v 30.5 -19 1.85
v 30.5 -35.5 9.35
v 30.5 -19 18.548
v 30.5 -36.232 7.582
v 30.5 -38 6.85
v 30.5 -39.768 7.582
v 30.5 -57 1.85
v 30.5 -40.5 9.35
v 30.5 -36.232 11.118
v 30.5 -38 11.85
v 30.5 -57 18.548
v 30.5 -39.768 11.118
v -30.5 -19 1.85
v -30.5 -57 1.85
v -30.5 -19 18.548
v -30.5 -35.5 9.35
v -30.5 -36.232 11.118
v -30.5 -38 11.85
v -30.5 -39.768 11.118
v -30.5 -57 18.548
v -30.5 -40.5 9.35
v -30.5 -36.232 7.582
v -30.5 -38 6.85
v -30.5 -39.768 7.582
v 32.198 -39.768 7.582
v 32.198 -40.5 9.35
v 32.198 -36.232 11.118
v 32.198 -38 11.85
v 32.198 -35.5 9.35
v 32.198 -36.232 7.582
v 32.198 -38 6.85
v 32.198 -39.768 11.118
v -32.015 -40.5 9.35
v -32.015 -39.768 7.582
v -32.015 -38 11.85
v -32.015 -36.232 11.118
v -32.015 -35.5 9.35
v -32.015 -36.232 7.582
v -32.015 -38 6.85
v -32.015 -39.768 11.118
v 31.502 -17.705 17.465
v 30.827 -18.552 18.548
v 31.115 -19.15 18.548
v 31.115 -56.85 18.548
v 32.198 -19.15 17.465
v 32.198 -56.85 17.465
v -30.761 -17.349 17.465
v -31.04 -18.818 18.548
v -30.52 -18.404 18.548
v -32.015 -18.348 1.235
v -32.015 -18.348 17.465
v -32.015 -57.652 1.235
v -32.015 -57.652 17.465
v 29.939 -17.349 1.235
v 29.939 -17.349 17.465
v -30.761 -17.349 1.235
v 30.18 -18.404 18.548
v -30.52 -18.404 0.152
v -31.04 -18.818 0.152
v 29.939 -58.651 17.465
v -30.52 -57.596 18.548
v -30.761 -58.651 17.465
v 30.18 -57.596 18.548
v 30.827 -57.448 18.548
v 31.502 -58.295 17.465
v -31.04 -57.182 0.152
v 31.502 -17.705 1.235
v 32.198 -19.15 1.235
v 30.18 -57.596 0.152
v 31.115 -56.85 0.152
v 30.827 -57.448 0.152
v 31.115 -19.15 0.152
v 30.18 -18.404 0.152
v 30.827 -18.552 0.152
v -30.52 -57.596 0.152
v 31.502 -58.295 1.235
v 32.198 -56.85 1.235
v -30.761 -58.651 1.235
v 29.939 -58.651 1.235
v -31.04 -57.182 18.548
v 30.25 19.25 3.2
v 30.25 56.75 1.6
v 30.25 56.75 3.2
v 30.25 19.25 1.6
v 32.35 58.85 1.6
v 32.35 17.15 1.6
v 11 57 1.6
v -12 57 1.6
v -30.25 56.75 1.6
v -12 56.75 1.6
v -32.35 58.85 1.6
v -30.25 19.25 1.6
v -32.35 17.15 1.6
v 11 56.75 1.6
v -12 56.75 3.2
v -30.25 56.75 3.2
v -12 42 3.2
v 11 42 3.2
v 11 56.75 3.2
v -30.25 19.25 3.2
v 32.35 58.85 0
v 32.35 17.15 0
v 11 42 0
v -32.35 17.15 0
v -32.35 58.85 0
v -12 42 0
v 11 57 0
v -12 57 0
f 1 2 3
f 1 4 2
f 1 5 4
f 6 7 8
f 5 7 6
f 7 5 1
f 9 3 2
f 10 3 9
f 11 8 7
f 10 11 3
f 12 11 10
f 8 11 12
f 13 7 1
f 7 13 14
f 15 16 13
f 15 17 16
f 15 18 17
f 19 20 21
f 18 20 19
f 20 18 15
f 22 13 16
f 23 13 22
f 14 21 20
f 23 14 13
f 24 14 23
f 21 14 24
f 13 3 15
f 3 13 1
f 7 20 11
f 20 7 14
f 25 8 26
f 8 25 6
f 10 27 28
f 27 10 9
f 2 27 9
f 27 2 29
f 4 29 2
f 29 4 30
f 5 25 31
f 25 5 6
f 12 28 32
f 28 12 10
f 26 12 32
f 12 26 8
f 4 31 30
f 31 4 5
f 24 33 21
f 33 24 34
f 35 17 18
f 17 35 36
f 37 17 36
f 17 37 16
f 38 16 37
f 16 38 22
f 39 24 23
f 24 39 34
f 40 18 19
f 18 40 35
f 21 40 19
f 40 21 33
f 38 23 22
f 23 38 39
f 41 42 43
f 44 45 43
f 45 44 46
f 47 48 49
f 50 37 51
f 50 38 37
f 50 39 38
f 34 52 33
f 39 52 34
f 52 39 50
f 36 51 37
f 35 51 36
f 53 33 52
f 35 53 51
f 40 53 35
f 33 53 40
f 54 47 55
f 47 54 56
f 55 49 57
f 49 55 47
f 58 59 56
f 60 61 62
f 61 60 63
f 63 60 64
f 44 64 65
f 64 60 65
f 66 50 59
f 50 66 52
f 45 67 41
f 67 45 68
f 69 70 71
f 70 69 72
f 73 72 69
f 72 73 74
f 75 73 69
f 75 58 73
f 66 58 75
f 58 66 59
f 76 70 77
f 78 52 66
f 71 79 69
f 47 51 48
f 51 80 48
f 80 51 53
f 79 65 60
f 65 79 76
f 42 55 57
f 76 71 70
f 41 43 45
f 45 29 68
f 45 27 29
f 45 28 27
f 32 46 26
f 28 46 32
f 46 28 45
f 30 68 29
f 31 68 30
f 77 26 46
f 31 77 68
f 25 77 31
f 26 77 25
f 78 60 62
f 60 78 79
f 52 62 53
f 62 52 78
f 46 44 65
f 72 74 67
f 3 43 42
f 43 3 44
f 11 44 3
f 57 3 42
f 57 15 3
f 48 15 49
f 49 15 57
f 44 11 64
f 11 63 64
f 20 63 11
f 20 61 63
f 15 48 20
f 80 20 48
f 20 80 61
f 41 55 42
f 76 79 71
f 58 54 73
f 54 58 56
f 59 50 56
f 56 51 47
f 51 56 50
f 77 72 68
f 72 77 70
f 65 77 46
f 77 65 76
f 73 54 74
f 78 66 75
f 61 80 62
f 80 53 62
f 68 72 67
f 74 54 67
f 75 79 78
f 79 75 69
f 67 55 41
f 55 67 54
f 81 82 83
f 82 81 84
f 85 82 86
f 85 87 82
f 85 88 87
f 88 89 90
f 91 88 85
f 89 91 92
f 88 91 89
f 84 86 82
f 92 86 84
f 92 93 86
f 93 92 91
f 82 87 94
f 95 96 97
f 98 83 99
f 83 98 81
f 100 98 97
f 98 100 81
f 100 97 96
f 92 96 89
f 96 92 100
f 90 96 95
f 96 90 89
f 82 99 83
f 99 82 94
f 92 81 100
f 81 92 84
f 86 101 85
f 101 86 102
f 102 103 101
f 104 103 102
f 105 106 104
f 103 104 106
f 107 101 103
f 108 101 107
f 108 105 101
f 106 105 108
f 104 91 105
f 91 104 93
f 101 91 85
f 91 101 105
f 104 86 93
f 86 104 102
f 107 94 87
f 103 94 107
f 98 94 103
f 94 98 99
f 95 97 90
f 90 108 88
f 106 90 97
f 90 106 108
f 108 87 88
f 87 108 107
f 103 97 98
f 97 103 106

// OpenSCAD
// Written by Jordi Riera-Babures <jrierab@gmail.com>
// LM2596 with lateral voltage window V1.0 - Parameterisized for Customizer
//
// To the extent possible under law, the author(s) have dedicated all
// copyright and related and neighboring rights to this software to the
// public domain worldwide. This software is distributed without any
// warranty.
//
// You should have received a copy of the CC0 Public Domain
// Dedication along with this software.
// If not, see <http://creativecommons.org/publicdomain/zero/1.0/>.

// Length of the board (mm)
Board_Length = 61;          // [40:300]
// Width of the board (mm)
Board_Width = 38;           // [10:40]
// Height of the board and its components (mm)
Board_Height = 15;          // [10:40]
// Volatge Window width (mm)
Voltage_Window_Width = 15;  // [10:20]
// Volatge Window legnth (mm)
Voltage_Window_Length = 23; // [0:30]

// Input/output hole radius
Hole_radius = 2.5;          // [2:10]

// Space to take into account around the board (mm)
Security_Margin = 0.5;      // [0.:5.]
// Wall thickness (mm)
Wall_Thickness = 1.6;       // [1.:5.]

// Account for security margins and walls
Xtra = Security_Margin + 2*Wall_Thickness;
// Hole pos
Hole_pos_x = (Board_Length + Xtra) / 2;



// Build the box
translate([0, -Board_Width, (Board_Height + Xtra)/2]) LM2596_case();
// And the lidl
mirror([0, 0, 1]) translate([0, Board_Width, -1.5*Wall_Thickness]) LM2596_lid();



module LM2596_lid() {
    difference() {
        union() {
            // Internal lid
            cube([Board_Length - Security_Margin, Board_Width - Security_Margin, Wall_Thickness], true);
            translate([0, 0, Wall_Thickness])
                cube([Board_Length + Xtra, Board_Width + Xtra, Wall_Thickness], true);
        }
        union() {
            // Voltage window hole
            translate([(Board_Length - Voltage_Window_Width)/2 - Voltage_Window_Length - Security_Margin, (Board_Width - Voltage_Window_Width)/2, 0])
                cube([Voltage_Window_Length, Voltage_Window_Width, 3*Wall_Thickness], true);
        }
    }

}

module LM2596_case() {
    // Smooth the case
    Rounded_Corner_Radius = 2;

    // Hole extension
    Hole_h = 1*(Wall_Thickness + Security_Margin);
    // Input hole Y tanslation
    Hole_y = (Board_Width - Hole_radius - 4*Security_Margin)/2;

    // Case
    difference() {
        // External case
        roundedcube_simple([Board_Length + Xtra, Board_Width + Xtra, Board_Height + Xtra], true, Rounded_Corner_Radius);
        // "Empty" inside block
        union() {
            // Internal board space
            cube([Board_Length, Board_Width, Board_Height], true);
            // Remove the top
            translate([0, 0, Board_Height])
                cube([Board_Length, Board_Width, Board_Height], true);
            // Input hole
            translate([Hole_pos_x - Hole_h, 0, 0])
                rotate([90, 0, 90])
                    cylinder(Hole_h, r = Hole_radius, true);
            // Output hole
            translate([-Hole_pos_x, 0, 0]) 
                rotate([90, 0, 90])
                    cylinder(Hole_h, r = Hole_radius, true);
        }
    }
}





// https://gist.github.com/groovenectar/292db1688b79efd6ce11
module roundedcube_simple(size = [1, 1, 1], center = false, radius = 0.5) {
	// If single value, convert to [x, y, z] vector
	size = (size[0] == undef) ? [size, size, size] : size;

	translate = (center == false) ?
		[radius, radius, radius] :
		[
			radius - (size[0] / 2),
			radius - (size[1] / 2),
			radius - (size[2] / 2)
	];

	translate(v = translate)
	minkowski() {
		cube(size = [
			size[0] - (radius * 2),
			size[1] - (radius * 2),
			size[2] - (radius * 2)
		]);
		sphere(r = radius);
	}
}
